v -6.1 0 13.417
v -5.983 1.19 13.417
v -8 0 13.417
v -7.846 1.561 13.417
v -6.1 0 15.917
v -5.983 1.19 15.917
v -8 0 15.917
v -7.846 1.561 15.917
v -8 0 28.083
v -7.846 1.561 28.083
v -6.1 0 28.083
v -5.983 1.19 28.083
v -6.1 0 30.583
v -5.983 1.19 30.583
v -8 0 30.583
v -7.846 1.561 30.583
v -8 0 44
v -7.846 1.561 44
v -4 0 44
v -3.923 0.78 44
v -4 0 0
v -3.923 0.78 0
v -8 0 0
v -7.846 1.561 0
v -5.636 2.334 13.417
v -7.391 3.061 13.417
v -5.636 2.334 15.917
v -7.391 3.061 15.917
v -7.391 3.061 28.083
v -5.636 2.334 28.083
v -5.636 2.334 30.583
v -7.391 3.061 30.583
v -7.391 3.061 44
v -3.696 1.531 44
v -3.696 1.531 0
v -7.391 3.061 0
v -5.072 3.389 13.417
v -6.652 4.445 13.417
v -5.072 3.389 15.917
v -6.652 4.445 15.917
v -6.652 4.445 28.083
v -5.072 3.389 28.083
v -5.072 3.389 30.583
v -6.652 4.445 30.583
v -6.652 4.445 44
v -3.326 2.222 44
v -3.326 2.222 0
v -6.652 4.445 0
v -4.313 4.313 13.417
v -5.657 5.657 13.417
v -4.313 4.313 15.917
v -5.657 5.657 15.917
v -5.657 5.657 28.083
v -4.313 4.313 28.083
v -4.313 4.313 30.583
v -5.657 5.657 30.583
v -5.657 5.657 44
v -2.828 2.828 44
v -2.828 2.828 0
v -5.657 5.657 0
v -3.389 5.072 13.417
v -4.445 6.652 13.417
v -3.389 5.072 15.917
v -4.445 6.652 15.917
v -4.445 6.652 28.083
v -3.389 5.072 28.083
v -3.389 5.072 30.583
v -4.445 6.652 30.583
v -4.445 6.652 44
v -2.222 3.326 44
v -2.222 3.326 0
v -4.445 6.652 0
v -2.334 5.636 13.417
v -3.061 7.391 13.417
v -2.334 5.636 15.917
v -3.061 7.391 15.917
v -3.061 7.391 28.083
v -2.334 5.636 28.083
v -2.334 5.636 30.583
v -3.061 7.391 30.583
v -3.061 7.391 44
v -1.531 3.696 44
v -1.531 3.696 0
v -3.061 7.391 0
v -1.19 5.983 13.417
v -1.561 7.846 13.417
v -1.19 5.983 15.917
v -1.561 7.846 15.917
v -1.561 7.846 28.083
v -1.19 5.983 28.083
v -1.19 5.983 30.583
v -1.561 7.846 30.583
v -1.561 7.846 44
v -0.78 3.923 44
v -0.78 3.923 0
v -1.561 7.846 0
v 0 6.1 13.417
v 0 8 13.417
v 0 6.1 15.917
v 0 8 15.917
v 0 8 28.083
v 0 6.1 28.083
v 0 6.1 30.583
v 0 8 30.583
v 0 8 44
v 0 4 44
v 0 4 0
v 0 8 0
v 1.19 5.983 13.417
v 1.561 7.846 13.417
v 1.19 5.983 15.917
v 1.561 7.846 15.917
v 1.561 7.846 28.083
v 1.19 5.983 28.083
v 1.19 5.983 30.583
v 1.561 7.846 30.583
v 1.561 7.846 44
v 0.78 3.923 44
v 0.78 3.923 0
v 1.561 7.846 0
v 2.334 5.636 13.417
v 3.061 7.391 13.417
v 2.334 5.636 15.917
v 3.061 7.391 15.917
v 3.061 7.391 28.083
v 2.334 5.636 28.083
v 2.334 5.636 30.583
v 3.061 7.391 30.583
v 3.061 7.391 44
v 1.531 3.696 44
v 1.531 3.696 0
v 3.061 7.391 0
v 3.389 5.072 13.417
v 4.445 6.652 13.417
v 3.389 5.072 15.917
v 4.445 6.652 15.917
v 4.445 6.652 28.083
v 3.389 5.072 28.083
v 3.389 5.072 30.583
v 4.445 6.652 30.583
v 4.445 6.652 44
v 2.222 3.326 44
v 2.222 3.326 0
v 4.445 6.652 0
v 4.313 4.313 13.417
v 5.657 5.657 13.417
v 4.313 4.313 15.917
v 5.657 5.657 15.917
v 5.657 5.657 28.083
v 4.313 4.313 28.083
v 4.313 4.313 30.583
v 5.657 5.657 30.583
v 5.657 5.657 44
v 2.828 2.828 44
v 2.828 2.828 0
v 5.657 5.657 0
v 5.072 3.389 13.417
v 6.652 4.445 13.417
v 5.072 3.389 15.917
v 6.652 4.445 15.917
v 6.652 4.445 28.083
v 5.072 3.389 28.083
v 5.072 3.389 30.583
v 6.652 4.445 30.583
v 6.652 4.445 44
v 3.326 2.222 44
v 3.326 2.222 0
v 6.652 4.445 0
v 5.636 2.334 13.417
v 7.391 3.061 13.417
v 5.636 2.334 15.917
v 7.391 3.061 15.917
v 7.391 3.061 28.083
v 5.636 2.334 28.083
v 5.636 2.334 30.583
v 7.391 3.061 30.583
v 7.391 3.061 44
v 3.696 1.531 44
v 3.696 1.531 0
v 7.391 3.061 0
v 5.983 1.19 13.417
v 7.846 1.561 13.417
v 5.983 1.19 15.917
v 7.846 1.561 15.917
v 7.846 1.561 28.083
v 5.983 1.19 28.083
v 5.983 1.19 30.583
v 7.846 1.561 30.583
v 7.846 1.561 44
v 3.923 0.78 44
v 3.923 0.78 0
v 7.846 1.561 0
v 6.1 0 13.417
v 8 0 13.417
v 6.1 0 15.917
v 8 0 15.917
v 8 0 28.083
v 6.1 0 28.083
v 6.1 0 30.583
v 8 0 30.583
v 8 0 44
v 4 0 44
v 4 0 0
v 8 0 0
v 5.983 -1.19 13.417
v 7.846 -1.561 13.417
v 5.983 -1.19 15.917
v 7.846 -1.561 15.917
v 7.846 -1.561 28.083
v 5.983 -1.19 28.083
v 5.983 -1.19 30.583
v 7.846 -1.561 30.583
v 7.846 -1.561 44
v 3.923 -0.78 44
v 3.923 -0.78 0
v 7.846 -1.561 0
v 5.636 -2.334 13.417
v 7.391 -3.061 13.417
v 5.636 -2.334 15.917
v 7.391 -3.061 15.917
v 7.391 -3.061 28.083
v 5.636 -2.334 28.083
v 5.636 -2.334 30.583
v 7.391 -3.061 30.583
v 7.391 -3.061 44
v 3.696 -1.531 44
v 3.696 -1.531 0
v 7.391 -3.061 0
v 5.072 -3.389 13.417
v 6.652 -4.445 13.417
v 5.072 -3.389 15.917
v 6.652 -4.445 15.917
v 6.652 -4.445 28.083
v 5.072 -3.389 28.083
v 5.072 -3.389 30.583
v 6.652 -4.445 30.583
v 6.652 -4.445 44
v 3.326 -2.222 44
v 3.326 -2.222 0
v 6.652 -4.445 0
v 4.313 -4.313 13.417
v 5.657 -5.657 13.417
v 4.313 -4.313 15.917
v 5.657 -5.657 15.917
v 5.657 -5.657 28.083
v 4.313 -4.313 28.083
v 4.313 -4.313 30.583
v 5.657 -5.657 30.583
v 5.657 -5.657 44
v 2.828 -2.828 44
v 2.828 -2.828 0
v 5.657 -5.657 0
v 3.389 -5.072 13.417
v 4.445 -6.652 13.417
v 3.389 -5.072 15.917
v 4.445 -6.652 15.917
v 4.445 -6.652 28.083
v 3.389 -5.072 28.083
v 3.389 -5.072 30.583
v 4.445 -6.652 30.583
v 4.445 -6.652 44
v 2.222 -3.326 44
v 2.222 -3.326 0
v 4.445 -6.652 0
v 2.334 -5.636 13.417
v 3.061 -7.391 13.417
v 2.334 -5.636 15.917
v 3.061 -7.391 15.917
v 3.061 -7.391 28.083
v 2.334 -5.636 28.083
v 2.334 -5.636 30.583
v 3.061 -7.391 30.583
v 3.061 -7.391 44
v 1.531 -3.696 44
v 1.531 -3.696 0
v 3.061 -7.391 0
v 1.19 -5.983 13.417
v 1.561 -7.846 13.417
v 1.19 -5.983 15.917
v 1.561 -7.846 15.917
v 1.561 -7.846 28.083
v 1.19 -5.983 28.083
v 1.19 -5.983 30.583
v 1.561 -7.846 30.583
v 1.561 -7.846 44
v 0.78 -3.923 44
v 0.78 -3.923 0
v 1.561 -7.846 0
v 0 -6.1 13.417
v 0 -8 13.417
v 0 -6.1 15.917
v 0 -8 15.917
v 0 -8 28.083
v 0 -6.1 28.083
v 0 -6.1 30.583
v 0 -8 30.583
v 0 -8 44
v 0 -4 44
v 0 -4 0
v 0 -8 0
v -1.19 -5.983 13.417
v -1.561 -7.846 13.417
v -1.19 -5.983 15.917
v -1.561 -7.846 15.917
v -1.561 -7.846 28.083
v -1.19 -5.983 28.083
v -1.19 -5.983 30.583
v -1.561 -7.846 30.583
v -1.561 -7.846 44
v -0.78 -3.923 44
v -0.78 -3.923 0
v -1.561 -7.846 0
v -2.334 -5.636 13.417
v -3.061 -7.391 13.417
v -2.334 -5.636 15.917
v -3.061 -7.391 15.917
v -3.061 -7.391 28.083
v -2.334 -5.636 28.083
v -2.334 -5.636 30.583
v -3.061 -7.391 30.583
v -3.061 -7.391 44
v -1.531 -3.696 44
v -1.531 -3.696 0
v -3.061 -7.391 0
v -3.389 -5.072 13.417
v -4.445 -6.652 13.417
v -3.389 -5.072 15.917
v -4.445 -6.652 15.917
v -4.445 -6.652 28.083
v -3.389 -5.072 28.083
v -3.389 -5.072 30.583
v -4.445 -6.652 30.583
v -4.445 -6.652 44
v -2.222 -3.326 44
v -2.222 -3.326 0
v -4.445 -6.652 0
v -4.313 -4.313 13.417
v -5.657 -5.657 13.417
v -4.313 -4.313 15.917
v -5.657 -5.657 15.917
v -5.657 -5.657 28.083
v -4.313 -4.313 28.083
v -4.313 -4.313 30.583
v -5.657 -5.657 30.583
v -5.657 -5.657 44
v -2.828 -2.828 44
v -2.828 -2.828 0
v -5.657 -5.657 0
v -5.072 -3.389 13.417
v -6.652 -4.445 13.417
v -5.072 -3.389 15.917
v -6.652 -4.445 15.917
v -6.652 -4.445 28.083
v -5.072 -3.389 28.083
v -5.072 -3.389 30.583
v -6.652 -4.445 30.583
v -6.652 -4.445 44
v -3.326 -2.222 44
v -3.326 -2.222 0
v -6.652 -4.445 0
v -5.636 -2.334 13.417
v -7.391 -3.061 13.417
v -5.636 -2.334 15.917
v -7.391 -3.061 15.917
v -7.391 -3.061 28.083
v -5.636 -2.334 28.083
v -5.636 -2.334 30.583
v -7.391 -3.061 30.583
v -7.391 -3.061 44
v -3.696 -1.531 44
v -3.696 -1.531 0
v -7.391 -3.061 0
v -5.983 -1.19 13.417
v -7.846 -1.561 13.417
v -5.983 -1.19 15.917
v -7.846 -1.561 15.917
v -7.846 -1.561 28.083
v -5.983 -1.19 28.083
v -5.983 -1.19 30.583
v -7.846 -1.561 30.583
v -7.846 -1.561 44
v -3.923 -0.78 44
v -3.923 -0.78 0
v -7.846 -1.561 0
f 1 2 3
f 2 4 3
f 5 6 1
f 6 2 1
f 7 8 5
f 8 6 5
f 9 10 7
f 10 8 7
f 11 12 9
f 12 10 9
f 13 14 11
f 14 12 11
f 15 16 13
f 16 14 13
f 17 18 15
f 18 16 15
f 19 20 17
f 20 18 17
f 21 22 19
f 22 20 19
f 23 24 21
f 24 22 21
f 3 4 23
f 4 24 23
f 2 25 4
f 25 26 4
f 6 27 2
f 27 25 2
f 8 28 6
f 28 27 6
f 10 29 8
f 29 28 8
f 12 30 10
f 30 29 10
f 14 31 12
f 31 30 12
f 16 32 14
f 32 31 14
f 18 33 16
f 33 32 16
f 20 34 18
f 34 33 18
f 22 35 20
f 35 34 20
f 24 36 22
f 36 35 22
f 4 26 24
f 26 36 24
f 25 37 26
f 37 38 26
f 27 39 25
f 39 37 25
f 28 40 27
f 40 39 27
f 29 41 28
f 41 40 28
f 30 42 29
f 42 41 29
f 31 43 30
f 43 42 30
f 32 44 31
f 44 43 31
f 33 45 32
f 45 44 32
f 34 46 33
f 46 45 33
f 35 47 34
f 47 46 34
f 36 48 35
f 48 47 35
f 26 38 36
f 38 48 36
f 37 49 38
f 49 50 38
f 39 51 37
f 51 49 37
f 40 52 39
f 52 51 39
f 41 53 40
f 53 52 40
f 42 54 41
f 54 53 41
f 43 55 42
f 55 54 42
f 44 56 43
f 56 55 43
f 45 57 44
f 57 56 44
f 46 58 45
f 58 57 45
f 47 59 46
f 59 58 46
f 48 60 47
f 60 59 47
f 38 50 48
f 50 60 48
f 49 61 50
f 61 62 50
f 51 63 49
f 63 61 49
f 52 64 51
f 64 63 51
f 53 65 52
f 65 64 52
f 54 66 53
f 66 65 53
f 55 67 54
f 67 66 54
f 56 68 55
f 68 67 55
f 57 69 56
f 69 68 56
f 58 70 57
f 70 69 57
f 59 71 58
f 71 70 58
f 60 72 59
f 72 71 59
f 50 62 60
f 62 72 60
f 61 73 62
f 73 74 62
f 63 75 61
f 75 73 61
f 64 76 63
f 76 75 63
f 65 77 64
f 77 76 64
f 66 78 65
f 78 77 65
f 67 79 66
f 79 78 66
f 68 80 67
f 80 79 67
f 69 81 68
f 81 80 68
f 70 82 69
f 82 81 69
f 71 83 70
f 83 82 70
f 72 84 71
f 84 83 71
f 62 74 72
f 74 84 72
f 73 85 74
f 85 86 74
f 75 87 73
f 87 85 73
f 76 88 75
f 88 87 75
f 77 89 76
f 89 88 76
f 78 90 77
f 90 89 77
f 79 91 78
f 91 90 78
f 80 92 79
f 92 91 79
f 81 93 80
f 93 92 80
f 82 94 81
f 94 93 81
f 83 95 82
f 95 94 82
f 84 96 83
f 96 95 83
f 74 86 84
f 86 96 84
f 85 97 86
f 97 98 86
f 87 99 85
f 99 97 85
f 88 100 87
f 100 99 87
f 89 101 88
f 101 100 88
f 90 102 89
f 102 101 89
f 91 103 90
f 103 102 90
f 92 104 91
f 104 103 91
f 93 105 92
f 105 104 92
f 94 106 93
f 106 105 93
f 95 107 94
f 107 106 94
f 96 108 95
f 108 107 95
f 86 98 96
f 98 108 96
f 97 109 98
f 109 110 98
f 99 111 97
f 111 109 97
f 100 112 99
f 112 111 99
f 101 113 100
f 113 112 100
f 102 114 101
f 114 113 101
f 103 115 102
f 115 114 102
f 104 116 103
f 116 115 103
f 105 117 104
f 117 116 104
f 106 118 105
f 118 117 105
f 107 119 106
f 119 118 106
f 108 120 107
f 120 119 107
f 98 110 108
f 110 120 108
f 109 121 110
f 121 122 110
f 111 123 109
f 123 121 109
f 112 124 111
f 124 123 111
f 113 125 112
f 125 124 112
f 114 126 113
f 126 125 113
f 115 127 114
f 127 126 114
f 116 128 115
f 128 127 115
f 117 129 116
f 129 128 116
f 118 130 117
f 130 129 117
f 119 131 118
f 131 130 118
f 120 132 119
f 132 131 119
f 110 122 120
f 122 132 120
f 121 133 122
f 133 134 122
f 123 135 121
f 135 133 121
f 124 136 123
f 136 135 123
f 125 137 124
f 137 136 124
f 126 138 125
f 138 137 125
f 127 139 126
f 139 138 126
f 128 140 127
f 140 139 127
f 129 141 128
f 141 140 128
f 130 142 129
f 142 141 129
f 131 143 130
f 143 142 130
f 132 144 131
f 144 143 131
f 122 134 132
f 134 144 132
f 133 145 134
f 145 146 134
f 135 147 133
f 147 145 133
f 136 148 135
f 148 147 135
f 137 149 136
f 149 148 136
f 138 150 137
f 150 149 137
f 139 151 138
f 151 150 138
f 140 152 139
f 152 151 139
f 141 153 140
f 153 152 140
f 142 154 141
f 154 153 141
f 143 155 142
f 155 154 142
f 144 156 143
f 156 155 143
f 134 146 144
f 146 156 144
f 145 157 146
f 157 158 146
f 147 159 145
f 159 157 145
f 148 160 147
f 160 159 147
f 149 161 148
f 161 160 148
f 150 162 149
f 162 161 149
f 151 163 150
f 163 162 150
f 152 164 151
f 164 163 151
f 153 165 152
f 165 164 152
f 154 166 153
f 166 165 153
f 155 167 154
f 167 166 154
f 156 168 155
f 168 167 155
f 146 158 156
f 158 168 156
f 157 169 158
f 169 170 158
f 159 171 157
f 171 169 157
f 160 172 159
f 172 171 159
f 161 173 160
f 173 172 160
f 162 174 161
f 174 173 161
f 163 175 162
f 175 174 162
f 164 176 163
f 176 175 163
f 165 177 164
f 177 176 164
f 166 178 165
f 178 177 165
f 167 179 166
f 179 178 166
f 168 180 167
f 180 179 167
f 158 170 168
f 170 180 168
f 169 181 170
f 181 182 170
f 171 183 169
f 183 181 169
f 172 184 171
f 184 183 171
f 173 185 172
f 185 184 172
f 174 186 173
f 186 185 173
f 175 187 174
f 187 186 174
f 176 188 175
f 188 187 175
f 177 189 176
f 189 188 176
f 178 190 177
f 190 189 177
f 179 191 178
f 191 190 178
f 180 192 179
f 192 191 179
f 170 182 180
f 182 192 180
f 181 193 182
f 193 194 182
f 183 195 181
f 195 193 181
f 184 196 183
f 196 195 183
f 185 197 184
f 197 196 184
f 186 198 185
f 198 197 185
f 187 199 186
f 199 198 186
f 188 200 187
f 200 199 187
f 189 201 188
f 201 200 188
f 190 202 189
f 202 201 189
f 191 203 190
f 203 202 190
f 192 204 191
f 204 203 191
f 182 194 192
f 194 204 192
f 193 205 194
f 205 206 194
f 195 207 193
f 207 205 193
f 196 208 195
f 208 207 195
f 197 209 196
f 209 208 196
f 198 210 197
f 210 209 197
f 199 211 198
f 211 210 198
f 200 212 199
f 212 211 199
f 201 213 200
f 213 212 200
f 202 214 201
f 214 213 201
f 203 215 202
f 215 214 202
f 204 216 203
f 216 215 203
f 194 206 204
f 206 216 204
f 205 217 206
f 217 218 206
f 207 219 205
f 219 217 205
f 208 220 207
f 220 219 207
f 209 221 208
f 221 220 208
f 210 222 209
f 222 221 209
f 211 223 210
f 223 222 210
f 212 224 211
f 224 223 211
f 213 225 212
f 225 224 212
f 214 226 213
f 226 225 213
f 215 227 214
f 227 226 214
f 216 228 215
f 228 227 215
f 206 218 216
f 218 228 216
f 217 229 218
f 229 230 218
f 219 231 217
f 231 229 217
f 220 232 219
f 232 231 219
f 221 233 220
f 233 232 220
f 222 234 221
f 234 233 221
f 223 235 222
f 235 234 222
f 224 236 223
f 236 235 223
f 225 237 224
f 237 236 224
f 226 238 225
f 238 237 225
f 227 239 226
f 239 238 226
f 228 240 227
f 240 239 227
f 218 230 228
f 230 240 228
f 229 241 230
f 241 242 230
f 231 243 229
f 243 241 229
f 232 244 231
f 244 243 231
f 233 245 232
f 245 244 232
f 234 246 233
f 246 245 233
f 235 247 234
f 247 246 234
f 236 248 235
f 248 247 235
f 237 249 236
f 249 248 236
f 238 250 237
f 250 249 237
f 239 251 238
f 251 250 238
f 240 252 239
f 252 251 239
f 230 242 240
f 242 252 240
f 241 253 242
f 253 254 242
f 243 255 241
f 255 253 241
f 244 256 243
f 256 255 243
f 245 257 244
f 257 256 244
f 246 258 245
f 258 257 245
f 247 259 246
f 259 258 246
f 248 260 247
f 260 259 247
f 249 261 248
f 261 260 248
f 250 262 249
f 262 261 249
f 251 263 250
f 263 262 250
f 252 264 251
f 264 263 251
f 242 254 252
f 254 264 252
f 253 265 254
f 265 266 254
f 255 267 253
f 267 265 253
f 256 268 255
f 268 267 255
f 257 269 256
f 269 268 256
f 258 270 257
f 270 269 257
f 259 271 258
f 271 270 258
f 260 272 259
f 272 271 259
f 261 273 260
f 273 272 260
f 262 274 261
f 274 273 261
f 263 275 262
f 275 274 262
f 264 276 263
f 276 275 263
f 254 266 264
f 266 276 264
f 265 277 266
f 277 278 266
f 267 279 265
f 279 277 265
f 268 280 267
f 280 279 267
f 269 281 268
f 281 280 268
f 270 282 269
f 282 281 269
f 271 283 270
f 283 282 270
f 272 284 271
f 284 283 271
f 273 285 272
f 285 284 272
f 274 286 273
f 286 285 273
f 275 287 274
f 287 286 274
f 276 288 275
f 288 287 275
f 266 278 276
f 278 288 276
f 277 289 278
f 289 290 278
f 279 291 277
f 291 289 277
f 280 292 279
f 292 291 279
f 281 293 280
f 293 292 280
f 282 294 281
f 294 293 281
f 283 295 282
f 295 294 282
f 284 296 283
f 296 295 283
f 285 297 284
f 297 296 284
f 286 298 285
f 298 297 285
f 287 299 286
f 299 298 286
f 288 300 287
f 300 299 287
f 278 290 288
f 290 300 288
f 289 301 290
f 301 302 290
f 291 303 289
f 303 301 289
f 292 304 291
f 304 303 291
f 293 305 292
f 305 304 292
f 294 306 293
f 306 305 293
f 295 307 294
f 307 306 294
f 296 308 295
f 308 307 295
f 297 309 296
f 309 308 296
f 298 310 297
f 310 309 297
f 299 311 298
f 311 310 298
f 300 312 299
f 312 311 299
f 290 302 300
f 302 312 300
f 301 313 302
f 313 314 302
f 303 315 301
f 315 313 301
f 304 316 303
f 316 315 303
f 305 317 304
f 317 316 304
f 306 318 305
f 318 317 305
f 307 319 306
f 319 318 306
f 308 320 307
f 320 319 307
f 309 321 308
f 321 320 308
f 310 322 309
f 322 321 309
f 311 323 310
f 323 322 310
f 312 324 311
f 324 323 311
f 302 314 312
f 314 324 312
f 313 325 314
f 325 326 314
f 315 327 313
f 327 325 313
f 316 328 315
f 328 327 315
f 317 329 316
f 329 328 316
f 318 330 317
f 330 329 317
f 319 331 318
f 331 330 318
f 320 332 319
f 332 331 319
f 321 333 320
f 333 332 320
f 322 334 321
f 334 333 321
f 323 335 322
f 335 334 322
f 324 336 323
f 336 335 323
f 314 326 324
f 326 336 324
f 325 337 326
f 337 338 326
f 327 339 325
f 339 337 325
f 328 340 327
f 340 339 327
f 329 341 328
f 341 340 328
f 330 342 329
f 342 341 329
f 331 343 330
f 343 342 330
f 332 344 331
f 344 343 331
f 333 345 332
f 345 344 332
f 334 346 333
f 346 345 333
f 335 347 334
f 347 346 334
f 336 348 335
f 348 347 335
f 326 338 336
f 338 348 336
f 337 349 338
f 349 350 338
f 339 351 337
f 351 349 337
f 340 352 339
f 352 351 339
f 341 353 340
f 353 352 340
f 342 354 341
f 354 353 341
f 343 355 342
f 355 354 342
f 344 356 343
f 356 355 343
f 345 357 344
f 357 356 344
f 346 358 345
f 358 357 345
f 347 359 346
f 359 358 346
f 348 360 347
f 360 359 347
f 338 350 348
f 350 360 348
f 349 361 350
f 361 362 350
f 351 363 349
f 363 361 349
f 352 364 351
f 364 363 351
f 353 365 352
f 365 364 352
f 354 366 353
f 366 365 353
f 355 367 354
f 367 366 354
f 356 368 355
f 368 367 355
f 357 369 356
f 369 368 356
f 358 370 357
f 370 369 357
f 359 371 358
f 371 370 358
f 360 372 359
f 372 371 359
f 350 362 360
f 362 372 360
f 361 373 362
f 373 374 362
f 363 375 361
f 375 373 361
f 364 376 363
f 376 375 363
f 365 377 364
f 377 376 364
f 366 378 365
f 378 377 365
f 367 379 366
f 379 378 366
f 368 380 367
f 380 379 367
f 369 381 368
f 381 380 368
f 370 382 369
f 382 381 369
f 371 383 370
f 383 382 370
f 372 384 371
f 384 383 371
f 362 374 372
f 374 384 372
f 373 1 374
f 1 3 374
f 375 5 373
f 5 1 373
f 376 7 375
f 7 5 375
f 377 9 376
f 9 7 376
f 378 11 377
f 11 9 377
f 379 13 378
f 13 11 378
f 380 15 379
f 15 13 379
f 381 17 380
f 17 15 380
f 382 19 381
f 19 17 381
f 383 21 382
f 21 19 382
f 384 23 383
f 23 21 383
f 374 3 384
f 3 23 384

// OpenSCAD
$fn = 32;

// ----------------------------------------------------------------------
// Grooved revolve: stepped, bore R4
// ----------------------------------------------------------------------

// --- parameters (mm) ---
bore_r = 4;               // bore radius
outer_r = 8;              // outer radius of the body
total_h = 44;             // overall height, Z
wall = 4;                 // radial wall thickness
groove_w = 2.5;           // groove width
groove_d = 1.9;           // groove depth
grooves = 2;              // number of outer grooves
fit_tol = 0.02;           // declared fit tolerance (prompt contract)
free_tol = 0.2;           // declared free tolerance (prompt contract)

bbox_x = 2 * outer_r;  // full diameter
bore_d = 2 * bore_r;  // bore diameter
body_d = 2 * outer_r;  // body diameter
revolve_angle = 360;  // full turn around the Z axis

profile = [[4, 0], [8, 0], [8, 13.417], [6.1, 13.417], [6.1, 15.917], [8, 15.917], [8, 28.083], [6.1, 28.083], [6.1, 30.583], [8, 30.583], [8, 44], [4, 44]];  // primary outline, 12 points, counter clockwise

// --- the one profile operation ---
rotate_extrude(angle = revolve_angle) polygon(points = profile);
